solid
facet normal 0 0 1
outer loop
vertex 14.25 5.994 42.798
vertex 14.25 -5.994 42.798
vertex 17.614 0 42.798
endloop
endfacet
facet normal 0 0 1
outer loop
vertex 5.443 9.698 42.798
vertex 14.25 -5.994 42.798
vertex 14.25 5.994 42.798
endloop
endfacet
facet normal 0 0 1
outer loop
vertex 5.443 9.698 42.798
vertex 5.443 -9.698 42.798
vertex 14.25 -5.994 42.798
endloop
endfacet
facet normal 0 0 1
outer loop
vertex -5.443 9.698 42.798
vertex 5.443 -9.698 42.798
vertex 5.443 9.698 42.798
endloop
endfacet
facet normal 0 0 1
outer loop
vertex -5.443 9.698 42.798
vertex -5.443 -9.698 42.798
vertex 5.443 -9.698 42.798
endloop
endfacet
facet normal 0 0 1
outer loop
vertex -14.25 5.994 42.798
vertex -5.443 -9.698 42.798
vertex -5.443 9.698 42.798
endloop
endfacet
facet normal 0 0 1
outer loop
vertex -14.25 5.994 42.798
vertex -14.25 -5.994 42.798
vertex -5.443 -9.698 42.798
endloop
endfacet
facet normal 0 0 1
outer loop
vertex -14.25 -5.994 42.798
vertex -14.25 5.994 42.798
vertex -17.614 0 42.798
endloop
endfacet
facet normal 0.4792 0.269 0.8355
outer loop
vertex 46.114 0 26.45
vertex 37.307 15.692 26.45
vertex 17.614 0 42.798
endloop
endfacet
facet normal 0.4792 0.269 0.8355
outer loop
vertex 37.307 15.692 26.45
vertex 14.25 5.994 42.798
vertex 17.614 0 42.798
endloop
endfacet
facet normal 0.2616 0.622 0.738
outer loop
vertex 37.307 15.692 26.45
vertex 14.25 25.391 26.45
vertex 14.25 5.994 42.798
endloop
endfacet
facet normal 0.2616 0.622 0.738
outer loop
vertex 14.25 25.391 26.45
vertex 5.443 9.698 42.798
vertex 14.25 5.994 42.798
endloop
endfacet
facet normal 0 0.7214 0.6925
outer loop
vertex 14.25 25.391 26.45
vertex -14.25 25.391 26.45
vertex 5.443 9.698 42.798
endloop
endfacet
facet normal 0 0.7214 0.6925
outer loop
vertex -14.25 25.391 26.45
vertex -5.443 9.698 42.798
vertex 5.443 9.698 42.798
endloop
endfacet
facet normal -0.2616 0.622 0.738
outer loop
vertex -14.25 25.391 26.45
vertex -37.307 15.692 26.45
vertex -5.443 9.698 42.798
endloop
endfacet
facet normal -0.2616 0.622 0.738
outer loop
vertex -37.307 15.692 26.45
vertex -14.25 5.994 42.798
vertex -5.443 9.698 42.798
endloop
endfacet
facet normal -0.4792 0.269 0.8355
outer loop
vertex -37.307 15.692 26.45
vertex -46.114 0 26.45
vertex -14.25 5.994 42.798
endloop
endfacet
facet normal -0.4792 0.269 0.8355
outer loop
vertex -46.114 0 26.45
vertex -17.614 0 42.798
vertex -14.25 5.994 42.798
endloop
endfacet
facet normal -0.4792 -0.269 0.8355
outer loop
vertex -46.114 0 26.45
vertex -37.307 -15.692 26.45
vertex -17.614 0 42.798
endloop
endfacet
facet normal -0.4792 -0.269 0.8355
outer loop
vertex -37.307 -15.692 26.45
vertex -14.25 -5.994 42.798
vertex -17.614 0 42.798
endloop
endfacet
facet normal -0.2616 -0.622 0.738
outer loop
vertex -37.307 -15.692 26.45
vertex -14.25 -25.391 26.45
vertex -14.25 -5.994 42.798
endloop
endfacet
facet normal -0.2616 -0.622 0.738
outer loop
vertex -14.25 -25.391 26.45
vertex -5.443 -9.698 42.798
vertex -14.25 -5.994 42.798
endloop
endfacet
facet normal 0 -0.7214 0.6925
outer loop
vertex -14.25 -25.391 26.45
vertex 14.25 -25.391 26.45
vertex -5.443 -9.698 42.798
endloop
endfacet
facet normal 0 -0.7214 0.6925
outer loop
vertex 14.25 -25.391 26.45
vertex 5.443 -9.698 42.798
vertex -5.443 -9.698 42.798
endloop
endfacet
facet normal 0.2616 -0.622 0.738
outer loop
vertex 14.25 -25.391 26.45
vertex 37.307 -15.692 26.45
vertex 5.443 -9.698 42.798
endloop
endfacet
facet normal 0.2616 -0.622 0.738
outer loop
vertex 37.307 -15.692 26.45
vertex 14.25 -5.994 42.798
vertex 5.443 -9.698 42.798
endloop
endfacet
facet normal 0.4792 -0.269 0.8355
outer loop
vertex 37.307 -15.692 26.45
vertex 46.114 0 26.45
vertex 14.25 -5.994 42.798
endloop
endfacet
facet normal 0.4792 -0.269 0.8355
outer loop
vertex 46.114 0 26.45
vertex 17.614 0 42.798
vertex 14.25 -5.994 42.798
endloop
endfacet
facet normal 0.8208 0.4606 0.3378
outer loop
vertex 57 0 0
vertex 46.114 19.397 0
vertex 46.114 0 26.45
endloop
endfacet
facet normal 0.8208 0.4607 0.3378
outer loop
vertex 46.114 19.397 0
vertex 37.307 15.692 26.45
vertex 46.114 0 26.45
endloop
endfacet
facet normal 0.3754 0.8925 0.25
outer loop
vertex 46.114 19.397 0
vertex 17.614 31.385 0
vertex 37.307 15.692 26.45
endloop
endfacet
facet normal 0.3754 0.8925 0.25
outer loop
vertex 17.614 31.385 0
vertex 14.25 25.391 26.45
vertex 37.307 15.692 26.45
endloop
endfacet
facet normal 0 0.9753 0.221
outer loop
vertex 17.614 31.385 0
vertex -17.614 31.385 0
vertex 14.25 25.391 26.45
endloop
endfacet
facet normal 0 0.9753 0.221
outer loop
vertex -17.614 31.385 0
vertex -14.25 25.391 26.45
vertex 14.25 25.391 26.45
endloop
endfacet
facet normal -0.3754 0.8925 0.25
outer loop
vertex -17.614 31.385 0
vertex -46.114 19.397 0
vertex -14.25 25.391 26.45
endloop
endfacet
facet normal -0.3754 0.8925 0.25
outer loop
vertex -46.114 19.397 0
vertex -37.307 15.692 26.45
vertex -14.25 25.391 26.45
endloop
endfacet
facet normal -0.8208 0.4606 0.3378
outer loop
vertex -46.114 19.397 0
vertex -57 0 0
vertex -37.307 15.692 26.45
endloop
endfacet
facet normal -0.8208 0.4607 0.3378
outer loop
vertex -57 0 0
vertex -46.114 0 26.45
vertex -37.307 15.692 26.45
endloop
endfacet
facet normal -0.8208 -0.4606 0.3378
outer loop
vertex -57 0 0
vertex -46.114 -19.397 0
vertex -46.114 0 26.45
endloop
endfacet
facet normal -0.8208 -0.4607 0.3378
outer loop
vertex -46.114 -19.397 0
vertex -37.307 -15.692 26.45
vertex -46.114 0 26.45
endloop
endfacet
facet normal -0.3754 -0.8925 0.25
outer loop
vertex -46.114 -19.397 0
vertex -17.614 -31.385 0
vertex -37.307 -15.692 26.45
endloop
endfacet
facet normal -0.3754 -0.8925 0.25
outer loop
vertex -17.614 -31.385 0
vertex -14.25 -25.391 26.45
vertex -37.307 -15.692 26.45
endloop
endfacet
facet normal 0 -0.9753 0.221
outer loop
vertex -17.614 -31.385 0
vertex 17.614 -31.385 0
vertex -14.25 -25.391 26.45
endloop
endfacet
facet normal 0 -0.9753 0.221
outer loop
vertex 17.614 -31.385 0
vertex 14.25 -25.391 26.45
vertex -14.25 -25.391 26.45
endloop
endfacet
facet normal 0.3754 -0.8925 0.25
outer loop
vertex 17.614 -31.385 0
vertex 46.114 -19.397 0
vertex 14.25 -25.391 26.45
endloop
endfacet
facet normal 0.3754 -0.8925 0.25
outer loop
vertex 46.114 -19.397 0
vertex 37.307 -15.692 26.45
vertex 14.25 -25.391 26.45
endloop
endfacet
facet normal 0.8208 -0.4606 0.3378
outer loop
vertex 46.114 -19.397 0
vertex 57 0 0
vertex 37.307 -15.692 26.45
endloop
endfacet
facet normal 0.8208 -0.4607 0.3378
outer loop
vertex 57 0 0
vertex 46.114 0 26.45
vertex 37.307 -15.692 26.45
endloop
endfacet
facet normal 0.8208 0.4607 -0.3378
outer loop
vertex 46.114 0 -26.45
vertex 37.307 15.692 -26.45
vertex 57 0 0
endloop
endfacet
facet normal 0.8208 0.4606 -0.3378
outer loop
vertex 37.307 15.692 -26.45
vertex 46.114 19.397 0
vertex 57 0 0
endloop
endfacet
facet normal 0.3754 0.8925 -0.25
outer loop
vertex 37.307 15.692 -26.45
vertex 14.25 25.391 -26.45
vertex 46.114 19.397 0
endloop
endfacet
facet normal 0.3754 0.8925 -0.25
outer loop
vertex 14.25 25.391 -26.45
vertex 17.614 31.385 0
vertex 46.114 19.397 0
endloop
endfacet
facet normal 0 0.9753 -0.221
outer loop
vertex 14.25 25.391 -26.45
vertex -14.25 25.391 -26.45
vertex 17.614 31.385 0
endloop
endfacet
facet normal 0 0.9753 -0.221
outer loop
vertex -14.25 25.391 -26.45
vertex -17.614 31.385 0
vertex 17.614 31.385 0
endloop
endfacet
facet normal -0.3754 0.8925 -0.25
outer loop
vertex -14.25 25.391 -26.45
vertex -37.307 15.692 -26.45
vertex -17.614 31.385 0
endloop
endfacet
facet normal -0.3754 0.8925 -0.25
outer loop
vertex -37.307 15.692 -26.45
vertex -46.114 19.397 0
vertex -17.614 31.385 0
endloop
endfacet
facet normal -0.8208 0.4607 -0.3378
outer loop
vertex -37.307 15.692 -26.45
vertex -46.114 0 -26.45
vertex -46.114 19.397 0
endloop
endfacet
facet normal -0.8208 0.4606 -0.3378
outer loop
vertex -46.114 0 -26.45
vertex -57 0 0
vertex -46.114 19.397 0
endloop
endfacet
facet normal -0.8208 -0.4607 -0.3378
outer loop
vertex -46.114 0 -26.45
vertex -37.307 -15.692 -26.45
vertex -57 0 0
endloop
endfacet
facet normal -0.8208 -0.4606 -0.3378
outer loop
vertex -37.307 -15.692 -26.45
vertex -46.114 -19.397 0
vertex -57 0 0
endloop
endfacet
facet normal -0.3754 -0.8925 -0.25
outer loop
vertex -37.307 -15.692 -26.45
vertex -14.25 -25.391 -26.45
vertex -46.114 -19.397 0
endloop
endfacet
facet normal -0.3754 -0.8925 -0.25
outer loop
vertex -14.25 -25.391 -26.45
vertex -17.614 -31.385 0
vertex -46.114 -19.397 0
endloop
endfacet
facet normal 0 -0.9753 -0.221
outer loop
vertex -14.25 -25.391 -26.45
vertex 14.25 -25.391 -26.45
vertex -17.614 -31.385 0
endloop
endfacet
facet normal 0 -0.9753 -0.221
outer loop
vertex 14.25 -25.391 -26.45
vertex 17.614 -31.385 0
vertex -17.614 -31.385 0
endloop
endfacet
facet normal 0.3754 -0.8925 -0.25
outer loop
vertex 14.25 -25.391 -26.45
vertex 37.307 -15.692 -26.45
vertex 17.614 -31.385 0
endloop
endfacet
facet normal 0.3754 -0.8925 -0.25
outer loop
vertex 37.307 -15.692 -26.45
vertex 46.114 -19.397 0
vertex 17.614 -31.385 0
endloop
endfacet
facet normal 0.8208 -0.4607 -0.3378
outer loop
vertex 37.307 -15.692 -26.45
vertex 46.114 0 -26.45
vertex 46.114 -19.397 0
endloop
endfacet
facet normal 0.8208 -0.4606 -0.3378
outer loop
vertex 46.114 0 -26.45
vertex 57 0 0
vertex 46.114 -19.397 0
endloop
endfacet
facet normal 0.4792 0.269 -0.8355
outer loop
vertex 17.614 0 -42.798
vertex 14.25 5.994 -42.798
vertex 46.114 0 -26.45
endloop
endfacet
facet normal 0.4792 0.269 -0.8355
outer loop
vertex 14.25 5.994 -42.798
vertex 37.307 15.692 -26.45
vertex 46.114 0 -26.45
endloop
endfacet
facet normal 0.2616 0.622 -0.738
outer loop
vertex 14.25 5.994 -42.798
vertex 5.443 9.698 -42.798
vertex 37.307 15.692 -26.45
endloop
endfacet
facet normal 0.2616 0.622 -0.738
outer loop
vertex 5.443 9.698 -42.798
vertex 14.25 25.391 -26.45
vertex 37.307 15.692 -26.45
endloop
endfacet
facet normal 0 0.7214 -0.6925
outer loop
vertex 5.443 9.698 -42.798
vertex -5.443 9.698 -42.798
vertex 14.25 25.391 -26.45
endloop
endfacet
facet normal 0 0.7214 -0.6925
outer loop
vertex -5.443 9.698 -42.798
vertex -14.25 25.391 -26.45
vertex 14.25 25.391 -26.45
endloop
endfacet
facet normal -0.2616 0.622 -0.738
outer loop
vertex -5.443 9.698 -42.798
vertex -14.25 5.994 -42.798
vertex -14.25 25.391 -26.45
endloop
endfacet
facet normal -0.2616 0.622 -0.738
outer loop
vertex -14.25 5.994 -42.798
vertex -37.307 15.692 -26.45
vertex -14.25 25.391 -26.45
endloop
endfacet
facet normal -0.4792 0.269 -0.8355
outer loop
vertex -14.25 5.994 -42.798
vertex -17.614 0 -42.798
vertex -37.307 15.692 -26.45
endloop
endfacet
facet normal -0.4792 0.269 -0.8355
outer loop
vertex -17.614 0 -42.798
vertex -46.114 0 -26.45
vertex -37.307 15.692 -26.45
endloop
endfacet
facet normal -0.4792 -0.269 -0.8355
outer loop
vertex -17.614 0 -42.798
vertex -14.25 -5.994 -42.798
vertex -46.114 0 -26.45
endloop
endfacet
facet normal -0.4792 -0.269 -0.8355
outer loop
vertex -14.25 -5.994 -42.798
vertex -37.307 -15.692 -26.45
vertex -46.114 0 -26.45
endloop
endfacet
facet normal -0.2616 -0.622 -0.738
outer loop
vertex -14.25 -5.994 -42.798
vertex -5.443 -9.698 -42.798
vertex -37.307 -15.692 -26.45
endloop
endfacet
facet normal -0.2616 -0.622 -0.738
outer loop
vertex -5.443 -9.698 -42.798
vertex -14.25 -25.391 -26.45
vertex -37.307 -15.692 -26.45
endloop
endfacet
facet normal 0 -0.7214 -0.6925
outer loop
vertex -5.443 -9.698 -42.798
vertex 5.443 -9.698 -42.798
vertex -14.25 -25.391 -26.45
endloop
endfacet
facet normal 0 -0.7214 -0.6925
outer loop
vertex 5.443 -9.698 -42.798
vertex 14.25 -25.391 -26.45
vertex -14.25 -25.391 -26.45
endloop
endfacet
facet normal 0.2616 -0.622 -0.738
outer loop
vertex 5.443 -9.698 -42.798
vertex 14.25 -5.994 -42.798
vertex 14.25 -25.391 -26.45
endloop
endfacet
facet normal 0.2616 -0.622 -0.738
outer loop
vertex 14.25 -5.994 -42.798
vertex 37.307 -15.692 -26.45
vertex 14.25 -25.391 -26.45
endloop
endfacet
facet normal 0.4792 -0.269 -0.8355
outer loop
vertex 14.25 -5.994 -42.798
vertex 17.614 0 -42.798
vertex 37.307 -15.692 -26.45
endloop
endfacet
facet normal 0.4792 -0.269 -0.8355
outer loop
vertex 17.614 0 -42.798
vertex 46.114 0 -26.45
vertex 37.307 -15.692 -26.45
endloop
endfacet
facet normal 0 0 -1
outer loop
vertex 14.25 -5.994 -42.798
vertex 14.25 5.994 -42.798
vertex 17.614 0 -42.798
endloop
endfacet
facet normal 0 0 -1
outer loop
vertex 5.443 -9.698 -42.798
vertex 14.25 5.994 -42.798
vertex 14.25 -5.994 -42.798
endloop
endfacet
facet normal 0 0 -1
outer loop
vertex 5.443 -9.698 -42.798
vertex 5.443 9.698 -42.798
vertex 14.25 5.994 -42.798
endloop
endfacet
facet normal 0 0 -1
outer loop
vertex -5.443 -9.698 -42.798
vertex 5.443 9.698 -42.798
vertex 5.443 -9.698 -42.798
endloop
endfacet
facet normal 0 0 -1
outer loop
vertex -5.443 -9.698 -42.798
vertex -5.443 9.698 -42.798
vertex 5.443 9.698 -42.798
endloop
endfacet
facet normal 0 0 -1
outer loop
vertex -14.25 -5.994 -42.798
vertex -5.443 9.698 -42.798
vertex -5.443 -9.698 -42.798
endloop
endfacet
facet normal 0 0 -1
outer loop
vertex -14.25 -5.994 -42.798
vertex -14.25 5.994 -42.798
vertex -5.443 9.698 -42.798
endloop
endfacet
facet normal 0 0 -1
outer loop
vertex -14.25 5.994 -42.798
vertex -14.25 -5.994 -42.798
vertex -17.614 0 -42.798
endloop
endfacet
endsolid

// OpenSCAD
// Generated by SolidPython 1.0.1 on 2020-07-29 00:46:54


scale(v = [19, 11, 15]) {
	sphere(r = 3);
}
/***********************************************
*********      SolidPython code:      **********
************************************************
 
# import packages: SolidPython
from solid import *
from solid.utils import *
from itertools import chain, combinations, permutations


class Resize:

    def __init__(self, scad_file):
        self.scad_file = scad_file
        #self.scad_file = import_scad(scad_file)
        # cone/cylinder param:
        self.r1 = 0
        self.r2 = 0
        self.h = 0
        # rectangular prism param:
        self.w = 0
        self.l = 0
        # ellipse param:
        self.r = 0

    # import OpenScad code (file name corresponds to shape)


    # classify shape + parameters
    def assign(self, param1, param2, param3):
        if self.scad_file == 'cone.scad':
            self.r1 = param1
            self.r2 = param2
            self.h = param3
        elif self.scad_file == 'cylinder.scad':
            self.r1 = param1
            self.r2 = param2
            self.h = param3
        elif self.scad_file == 'rectangularPrism.scad':
            self.h = param1
            self.l = param2
            self.w = param3
        else:
            self.r = param1
            self.h = param2

    # resize parameters
    def iterate(self):
        x = range(3, 20, 2)
        i = 1
        if self.scad_file == 'cone.scad':
            tempList = list(permutations(x, 2))
            for temp in tempList:
                param1 = temp[0]
                param2 = temp[1]
                filepath = 'produced_scad_files/' + 'cone' + str(param1) + '_' + str(param2) + '_' + '.scad'
                scad_render_to_file(cylinder(h=param1, r1=param2, r2=0), filepath)

        elif self.scad_file == 'cylinder.scad':
            tempList = list(permutations(x, 3))
            for temp in tempList:
                param1 = temp[0]
                param2 = temp[1]
                filepath = 'produced_scad_files/' + 'cylinder' + str(param1) + '_' + str(param2) + '_' + '.scad'
                scad_render_to_file(cylinder(h=param1, r1=param2, r2=param2), filepath)

        elif self.scad_file == 'rectangularPrism.scad':
            tempList = list(permutations(x, 3))
            for temp in tempList:
                param1 = temp[0]
                param2 = temp[1]
                param3 = temp[2]
                filepath = 'produced_scad_files/' + 'rectangularPrism' + str(param1) + '_' + str(param2) + '_' + str(
                    param3) + '.scad'
                scad_render_to_file(cube(size=(param1, param2, param3)), filepath)

        elif self.scad_file == 'ellipse.scad':
            tempList = list(permutations(x, 4))
            for temp in tempList:
                param1 = temp[0]
                param2 = temp[1]
                param3 = temp[2]
                param4 = temp[3]
                filepath = 'produced_scad_files/' + 'ellipse' + str(param1) + '_' + str(param2) + '_' + str(param3) + '_' + str(param4) + '.scad'
                scad_render_to_file(scale([param1, param2, param3])(sphere(r=param4)), filepath)

    def render_to_scadfile(self):
        scad_render_to_file(scad, 'example.scad') 
 
************************************************/
